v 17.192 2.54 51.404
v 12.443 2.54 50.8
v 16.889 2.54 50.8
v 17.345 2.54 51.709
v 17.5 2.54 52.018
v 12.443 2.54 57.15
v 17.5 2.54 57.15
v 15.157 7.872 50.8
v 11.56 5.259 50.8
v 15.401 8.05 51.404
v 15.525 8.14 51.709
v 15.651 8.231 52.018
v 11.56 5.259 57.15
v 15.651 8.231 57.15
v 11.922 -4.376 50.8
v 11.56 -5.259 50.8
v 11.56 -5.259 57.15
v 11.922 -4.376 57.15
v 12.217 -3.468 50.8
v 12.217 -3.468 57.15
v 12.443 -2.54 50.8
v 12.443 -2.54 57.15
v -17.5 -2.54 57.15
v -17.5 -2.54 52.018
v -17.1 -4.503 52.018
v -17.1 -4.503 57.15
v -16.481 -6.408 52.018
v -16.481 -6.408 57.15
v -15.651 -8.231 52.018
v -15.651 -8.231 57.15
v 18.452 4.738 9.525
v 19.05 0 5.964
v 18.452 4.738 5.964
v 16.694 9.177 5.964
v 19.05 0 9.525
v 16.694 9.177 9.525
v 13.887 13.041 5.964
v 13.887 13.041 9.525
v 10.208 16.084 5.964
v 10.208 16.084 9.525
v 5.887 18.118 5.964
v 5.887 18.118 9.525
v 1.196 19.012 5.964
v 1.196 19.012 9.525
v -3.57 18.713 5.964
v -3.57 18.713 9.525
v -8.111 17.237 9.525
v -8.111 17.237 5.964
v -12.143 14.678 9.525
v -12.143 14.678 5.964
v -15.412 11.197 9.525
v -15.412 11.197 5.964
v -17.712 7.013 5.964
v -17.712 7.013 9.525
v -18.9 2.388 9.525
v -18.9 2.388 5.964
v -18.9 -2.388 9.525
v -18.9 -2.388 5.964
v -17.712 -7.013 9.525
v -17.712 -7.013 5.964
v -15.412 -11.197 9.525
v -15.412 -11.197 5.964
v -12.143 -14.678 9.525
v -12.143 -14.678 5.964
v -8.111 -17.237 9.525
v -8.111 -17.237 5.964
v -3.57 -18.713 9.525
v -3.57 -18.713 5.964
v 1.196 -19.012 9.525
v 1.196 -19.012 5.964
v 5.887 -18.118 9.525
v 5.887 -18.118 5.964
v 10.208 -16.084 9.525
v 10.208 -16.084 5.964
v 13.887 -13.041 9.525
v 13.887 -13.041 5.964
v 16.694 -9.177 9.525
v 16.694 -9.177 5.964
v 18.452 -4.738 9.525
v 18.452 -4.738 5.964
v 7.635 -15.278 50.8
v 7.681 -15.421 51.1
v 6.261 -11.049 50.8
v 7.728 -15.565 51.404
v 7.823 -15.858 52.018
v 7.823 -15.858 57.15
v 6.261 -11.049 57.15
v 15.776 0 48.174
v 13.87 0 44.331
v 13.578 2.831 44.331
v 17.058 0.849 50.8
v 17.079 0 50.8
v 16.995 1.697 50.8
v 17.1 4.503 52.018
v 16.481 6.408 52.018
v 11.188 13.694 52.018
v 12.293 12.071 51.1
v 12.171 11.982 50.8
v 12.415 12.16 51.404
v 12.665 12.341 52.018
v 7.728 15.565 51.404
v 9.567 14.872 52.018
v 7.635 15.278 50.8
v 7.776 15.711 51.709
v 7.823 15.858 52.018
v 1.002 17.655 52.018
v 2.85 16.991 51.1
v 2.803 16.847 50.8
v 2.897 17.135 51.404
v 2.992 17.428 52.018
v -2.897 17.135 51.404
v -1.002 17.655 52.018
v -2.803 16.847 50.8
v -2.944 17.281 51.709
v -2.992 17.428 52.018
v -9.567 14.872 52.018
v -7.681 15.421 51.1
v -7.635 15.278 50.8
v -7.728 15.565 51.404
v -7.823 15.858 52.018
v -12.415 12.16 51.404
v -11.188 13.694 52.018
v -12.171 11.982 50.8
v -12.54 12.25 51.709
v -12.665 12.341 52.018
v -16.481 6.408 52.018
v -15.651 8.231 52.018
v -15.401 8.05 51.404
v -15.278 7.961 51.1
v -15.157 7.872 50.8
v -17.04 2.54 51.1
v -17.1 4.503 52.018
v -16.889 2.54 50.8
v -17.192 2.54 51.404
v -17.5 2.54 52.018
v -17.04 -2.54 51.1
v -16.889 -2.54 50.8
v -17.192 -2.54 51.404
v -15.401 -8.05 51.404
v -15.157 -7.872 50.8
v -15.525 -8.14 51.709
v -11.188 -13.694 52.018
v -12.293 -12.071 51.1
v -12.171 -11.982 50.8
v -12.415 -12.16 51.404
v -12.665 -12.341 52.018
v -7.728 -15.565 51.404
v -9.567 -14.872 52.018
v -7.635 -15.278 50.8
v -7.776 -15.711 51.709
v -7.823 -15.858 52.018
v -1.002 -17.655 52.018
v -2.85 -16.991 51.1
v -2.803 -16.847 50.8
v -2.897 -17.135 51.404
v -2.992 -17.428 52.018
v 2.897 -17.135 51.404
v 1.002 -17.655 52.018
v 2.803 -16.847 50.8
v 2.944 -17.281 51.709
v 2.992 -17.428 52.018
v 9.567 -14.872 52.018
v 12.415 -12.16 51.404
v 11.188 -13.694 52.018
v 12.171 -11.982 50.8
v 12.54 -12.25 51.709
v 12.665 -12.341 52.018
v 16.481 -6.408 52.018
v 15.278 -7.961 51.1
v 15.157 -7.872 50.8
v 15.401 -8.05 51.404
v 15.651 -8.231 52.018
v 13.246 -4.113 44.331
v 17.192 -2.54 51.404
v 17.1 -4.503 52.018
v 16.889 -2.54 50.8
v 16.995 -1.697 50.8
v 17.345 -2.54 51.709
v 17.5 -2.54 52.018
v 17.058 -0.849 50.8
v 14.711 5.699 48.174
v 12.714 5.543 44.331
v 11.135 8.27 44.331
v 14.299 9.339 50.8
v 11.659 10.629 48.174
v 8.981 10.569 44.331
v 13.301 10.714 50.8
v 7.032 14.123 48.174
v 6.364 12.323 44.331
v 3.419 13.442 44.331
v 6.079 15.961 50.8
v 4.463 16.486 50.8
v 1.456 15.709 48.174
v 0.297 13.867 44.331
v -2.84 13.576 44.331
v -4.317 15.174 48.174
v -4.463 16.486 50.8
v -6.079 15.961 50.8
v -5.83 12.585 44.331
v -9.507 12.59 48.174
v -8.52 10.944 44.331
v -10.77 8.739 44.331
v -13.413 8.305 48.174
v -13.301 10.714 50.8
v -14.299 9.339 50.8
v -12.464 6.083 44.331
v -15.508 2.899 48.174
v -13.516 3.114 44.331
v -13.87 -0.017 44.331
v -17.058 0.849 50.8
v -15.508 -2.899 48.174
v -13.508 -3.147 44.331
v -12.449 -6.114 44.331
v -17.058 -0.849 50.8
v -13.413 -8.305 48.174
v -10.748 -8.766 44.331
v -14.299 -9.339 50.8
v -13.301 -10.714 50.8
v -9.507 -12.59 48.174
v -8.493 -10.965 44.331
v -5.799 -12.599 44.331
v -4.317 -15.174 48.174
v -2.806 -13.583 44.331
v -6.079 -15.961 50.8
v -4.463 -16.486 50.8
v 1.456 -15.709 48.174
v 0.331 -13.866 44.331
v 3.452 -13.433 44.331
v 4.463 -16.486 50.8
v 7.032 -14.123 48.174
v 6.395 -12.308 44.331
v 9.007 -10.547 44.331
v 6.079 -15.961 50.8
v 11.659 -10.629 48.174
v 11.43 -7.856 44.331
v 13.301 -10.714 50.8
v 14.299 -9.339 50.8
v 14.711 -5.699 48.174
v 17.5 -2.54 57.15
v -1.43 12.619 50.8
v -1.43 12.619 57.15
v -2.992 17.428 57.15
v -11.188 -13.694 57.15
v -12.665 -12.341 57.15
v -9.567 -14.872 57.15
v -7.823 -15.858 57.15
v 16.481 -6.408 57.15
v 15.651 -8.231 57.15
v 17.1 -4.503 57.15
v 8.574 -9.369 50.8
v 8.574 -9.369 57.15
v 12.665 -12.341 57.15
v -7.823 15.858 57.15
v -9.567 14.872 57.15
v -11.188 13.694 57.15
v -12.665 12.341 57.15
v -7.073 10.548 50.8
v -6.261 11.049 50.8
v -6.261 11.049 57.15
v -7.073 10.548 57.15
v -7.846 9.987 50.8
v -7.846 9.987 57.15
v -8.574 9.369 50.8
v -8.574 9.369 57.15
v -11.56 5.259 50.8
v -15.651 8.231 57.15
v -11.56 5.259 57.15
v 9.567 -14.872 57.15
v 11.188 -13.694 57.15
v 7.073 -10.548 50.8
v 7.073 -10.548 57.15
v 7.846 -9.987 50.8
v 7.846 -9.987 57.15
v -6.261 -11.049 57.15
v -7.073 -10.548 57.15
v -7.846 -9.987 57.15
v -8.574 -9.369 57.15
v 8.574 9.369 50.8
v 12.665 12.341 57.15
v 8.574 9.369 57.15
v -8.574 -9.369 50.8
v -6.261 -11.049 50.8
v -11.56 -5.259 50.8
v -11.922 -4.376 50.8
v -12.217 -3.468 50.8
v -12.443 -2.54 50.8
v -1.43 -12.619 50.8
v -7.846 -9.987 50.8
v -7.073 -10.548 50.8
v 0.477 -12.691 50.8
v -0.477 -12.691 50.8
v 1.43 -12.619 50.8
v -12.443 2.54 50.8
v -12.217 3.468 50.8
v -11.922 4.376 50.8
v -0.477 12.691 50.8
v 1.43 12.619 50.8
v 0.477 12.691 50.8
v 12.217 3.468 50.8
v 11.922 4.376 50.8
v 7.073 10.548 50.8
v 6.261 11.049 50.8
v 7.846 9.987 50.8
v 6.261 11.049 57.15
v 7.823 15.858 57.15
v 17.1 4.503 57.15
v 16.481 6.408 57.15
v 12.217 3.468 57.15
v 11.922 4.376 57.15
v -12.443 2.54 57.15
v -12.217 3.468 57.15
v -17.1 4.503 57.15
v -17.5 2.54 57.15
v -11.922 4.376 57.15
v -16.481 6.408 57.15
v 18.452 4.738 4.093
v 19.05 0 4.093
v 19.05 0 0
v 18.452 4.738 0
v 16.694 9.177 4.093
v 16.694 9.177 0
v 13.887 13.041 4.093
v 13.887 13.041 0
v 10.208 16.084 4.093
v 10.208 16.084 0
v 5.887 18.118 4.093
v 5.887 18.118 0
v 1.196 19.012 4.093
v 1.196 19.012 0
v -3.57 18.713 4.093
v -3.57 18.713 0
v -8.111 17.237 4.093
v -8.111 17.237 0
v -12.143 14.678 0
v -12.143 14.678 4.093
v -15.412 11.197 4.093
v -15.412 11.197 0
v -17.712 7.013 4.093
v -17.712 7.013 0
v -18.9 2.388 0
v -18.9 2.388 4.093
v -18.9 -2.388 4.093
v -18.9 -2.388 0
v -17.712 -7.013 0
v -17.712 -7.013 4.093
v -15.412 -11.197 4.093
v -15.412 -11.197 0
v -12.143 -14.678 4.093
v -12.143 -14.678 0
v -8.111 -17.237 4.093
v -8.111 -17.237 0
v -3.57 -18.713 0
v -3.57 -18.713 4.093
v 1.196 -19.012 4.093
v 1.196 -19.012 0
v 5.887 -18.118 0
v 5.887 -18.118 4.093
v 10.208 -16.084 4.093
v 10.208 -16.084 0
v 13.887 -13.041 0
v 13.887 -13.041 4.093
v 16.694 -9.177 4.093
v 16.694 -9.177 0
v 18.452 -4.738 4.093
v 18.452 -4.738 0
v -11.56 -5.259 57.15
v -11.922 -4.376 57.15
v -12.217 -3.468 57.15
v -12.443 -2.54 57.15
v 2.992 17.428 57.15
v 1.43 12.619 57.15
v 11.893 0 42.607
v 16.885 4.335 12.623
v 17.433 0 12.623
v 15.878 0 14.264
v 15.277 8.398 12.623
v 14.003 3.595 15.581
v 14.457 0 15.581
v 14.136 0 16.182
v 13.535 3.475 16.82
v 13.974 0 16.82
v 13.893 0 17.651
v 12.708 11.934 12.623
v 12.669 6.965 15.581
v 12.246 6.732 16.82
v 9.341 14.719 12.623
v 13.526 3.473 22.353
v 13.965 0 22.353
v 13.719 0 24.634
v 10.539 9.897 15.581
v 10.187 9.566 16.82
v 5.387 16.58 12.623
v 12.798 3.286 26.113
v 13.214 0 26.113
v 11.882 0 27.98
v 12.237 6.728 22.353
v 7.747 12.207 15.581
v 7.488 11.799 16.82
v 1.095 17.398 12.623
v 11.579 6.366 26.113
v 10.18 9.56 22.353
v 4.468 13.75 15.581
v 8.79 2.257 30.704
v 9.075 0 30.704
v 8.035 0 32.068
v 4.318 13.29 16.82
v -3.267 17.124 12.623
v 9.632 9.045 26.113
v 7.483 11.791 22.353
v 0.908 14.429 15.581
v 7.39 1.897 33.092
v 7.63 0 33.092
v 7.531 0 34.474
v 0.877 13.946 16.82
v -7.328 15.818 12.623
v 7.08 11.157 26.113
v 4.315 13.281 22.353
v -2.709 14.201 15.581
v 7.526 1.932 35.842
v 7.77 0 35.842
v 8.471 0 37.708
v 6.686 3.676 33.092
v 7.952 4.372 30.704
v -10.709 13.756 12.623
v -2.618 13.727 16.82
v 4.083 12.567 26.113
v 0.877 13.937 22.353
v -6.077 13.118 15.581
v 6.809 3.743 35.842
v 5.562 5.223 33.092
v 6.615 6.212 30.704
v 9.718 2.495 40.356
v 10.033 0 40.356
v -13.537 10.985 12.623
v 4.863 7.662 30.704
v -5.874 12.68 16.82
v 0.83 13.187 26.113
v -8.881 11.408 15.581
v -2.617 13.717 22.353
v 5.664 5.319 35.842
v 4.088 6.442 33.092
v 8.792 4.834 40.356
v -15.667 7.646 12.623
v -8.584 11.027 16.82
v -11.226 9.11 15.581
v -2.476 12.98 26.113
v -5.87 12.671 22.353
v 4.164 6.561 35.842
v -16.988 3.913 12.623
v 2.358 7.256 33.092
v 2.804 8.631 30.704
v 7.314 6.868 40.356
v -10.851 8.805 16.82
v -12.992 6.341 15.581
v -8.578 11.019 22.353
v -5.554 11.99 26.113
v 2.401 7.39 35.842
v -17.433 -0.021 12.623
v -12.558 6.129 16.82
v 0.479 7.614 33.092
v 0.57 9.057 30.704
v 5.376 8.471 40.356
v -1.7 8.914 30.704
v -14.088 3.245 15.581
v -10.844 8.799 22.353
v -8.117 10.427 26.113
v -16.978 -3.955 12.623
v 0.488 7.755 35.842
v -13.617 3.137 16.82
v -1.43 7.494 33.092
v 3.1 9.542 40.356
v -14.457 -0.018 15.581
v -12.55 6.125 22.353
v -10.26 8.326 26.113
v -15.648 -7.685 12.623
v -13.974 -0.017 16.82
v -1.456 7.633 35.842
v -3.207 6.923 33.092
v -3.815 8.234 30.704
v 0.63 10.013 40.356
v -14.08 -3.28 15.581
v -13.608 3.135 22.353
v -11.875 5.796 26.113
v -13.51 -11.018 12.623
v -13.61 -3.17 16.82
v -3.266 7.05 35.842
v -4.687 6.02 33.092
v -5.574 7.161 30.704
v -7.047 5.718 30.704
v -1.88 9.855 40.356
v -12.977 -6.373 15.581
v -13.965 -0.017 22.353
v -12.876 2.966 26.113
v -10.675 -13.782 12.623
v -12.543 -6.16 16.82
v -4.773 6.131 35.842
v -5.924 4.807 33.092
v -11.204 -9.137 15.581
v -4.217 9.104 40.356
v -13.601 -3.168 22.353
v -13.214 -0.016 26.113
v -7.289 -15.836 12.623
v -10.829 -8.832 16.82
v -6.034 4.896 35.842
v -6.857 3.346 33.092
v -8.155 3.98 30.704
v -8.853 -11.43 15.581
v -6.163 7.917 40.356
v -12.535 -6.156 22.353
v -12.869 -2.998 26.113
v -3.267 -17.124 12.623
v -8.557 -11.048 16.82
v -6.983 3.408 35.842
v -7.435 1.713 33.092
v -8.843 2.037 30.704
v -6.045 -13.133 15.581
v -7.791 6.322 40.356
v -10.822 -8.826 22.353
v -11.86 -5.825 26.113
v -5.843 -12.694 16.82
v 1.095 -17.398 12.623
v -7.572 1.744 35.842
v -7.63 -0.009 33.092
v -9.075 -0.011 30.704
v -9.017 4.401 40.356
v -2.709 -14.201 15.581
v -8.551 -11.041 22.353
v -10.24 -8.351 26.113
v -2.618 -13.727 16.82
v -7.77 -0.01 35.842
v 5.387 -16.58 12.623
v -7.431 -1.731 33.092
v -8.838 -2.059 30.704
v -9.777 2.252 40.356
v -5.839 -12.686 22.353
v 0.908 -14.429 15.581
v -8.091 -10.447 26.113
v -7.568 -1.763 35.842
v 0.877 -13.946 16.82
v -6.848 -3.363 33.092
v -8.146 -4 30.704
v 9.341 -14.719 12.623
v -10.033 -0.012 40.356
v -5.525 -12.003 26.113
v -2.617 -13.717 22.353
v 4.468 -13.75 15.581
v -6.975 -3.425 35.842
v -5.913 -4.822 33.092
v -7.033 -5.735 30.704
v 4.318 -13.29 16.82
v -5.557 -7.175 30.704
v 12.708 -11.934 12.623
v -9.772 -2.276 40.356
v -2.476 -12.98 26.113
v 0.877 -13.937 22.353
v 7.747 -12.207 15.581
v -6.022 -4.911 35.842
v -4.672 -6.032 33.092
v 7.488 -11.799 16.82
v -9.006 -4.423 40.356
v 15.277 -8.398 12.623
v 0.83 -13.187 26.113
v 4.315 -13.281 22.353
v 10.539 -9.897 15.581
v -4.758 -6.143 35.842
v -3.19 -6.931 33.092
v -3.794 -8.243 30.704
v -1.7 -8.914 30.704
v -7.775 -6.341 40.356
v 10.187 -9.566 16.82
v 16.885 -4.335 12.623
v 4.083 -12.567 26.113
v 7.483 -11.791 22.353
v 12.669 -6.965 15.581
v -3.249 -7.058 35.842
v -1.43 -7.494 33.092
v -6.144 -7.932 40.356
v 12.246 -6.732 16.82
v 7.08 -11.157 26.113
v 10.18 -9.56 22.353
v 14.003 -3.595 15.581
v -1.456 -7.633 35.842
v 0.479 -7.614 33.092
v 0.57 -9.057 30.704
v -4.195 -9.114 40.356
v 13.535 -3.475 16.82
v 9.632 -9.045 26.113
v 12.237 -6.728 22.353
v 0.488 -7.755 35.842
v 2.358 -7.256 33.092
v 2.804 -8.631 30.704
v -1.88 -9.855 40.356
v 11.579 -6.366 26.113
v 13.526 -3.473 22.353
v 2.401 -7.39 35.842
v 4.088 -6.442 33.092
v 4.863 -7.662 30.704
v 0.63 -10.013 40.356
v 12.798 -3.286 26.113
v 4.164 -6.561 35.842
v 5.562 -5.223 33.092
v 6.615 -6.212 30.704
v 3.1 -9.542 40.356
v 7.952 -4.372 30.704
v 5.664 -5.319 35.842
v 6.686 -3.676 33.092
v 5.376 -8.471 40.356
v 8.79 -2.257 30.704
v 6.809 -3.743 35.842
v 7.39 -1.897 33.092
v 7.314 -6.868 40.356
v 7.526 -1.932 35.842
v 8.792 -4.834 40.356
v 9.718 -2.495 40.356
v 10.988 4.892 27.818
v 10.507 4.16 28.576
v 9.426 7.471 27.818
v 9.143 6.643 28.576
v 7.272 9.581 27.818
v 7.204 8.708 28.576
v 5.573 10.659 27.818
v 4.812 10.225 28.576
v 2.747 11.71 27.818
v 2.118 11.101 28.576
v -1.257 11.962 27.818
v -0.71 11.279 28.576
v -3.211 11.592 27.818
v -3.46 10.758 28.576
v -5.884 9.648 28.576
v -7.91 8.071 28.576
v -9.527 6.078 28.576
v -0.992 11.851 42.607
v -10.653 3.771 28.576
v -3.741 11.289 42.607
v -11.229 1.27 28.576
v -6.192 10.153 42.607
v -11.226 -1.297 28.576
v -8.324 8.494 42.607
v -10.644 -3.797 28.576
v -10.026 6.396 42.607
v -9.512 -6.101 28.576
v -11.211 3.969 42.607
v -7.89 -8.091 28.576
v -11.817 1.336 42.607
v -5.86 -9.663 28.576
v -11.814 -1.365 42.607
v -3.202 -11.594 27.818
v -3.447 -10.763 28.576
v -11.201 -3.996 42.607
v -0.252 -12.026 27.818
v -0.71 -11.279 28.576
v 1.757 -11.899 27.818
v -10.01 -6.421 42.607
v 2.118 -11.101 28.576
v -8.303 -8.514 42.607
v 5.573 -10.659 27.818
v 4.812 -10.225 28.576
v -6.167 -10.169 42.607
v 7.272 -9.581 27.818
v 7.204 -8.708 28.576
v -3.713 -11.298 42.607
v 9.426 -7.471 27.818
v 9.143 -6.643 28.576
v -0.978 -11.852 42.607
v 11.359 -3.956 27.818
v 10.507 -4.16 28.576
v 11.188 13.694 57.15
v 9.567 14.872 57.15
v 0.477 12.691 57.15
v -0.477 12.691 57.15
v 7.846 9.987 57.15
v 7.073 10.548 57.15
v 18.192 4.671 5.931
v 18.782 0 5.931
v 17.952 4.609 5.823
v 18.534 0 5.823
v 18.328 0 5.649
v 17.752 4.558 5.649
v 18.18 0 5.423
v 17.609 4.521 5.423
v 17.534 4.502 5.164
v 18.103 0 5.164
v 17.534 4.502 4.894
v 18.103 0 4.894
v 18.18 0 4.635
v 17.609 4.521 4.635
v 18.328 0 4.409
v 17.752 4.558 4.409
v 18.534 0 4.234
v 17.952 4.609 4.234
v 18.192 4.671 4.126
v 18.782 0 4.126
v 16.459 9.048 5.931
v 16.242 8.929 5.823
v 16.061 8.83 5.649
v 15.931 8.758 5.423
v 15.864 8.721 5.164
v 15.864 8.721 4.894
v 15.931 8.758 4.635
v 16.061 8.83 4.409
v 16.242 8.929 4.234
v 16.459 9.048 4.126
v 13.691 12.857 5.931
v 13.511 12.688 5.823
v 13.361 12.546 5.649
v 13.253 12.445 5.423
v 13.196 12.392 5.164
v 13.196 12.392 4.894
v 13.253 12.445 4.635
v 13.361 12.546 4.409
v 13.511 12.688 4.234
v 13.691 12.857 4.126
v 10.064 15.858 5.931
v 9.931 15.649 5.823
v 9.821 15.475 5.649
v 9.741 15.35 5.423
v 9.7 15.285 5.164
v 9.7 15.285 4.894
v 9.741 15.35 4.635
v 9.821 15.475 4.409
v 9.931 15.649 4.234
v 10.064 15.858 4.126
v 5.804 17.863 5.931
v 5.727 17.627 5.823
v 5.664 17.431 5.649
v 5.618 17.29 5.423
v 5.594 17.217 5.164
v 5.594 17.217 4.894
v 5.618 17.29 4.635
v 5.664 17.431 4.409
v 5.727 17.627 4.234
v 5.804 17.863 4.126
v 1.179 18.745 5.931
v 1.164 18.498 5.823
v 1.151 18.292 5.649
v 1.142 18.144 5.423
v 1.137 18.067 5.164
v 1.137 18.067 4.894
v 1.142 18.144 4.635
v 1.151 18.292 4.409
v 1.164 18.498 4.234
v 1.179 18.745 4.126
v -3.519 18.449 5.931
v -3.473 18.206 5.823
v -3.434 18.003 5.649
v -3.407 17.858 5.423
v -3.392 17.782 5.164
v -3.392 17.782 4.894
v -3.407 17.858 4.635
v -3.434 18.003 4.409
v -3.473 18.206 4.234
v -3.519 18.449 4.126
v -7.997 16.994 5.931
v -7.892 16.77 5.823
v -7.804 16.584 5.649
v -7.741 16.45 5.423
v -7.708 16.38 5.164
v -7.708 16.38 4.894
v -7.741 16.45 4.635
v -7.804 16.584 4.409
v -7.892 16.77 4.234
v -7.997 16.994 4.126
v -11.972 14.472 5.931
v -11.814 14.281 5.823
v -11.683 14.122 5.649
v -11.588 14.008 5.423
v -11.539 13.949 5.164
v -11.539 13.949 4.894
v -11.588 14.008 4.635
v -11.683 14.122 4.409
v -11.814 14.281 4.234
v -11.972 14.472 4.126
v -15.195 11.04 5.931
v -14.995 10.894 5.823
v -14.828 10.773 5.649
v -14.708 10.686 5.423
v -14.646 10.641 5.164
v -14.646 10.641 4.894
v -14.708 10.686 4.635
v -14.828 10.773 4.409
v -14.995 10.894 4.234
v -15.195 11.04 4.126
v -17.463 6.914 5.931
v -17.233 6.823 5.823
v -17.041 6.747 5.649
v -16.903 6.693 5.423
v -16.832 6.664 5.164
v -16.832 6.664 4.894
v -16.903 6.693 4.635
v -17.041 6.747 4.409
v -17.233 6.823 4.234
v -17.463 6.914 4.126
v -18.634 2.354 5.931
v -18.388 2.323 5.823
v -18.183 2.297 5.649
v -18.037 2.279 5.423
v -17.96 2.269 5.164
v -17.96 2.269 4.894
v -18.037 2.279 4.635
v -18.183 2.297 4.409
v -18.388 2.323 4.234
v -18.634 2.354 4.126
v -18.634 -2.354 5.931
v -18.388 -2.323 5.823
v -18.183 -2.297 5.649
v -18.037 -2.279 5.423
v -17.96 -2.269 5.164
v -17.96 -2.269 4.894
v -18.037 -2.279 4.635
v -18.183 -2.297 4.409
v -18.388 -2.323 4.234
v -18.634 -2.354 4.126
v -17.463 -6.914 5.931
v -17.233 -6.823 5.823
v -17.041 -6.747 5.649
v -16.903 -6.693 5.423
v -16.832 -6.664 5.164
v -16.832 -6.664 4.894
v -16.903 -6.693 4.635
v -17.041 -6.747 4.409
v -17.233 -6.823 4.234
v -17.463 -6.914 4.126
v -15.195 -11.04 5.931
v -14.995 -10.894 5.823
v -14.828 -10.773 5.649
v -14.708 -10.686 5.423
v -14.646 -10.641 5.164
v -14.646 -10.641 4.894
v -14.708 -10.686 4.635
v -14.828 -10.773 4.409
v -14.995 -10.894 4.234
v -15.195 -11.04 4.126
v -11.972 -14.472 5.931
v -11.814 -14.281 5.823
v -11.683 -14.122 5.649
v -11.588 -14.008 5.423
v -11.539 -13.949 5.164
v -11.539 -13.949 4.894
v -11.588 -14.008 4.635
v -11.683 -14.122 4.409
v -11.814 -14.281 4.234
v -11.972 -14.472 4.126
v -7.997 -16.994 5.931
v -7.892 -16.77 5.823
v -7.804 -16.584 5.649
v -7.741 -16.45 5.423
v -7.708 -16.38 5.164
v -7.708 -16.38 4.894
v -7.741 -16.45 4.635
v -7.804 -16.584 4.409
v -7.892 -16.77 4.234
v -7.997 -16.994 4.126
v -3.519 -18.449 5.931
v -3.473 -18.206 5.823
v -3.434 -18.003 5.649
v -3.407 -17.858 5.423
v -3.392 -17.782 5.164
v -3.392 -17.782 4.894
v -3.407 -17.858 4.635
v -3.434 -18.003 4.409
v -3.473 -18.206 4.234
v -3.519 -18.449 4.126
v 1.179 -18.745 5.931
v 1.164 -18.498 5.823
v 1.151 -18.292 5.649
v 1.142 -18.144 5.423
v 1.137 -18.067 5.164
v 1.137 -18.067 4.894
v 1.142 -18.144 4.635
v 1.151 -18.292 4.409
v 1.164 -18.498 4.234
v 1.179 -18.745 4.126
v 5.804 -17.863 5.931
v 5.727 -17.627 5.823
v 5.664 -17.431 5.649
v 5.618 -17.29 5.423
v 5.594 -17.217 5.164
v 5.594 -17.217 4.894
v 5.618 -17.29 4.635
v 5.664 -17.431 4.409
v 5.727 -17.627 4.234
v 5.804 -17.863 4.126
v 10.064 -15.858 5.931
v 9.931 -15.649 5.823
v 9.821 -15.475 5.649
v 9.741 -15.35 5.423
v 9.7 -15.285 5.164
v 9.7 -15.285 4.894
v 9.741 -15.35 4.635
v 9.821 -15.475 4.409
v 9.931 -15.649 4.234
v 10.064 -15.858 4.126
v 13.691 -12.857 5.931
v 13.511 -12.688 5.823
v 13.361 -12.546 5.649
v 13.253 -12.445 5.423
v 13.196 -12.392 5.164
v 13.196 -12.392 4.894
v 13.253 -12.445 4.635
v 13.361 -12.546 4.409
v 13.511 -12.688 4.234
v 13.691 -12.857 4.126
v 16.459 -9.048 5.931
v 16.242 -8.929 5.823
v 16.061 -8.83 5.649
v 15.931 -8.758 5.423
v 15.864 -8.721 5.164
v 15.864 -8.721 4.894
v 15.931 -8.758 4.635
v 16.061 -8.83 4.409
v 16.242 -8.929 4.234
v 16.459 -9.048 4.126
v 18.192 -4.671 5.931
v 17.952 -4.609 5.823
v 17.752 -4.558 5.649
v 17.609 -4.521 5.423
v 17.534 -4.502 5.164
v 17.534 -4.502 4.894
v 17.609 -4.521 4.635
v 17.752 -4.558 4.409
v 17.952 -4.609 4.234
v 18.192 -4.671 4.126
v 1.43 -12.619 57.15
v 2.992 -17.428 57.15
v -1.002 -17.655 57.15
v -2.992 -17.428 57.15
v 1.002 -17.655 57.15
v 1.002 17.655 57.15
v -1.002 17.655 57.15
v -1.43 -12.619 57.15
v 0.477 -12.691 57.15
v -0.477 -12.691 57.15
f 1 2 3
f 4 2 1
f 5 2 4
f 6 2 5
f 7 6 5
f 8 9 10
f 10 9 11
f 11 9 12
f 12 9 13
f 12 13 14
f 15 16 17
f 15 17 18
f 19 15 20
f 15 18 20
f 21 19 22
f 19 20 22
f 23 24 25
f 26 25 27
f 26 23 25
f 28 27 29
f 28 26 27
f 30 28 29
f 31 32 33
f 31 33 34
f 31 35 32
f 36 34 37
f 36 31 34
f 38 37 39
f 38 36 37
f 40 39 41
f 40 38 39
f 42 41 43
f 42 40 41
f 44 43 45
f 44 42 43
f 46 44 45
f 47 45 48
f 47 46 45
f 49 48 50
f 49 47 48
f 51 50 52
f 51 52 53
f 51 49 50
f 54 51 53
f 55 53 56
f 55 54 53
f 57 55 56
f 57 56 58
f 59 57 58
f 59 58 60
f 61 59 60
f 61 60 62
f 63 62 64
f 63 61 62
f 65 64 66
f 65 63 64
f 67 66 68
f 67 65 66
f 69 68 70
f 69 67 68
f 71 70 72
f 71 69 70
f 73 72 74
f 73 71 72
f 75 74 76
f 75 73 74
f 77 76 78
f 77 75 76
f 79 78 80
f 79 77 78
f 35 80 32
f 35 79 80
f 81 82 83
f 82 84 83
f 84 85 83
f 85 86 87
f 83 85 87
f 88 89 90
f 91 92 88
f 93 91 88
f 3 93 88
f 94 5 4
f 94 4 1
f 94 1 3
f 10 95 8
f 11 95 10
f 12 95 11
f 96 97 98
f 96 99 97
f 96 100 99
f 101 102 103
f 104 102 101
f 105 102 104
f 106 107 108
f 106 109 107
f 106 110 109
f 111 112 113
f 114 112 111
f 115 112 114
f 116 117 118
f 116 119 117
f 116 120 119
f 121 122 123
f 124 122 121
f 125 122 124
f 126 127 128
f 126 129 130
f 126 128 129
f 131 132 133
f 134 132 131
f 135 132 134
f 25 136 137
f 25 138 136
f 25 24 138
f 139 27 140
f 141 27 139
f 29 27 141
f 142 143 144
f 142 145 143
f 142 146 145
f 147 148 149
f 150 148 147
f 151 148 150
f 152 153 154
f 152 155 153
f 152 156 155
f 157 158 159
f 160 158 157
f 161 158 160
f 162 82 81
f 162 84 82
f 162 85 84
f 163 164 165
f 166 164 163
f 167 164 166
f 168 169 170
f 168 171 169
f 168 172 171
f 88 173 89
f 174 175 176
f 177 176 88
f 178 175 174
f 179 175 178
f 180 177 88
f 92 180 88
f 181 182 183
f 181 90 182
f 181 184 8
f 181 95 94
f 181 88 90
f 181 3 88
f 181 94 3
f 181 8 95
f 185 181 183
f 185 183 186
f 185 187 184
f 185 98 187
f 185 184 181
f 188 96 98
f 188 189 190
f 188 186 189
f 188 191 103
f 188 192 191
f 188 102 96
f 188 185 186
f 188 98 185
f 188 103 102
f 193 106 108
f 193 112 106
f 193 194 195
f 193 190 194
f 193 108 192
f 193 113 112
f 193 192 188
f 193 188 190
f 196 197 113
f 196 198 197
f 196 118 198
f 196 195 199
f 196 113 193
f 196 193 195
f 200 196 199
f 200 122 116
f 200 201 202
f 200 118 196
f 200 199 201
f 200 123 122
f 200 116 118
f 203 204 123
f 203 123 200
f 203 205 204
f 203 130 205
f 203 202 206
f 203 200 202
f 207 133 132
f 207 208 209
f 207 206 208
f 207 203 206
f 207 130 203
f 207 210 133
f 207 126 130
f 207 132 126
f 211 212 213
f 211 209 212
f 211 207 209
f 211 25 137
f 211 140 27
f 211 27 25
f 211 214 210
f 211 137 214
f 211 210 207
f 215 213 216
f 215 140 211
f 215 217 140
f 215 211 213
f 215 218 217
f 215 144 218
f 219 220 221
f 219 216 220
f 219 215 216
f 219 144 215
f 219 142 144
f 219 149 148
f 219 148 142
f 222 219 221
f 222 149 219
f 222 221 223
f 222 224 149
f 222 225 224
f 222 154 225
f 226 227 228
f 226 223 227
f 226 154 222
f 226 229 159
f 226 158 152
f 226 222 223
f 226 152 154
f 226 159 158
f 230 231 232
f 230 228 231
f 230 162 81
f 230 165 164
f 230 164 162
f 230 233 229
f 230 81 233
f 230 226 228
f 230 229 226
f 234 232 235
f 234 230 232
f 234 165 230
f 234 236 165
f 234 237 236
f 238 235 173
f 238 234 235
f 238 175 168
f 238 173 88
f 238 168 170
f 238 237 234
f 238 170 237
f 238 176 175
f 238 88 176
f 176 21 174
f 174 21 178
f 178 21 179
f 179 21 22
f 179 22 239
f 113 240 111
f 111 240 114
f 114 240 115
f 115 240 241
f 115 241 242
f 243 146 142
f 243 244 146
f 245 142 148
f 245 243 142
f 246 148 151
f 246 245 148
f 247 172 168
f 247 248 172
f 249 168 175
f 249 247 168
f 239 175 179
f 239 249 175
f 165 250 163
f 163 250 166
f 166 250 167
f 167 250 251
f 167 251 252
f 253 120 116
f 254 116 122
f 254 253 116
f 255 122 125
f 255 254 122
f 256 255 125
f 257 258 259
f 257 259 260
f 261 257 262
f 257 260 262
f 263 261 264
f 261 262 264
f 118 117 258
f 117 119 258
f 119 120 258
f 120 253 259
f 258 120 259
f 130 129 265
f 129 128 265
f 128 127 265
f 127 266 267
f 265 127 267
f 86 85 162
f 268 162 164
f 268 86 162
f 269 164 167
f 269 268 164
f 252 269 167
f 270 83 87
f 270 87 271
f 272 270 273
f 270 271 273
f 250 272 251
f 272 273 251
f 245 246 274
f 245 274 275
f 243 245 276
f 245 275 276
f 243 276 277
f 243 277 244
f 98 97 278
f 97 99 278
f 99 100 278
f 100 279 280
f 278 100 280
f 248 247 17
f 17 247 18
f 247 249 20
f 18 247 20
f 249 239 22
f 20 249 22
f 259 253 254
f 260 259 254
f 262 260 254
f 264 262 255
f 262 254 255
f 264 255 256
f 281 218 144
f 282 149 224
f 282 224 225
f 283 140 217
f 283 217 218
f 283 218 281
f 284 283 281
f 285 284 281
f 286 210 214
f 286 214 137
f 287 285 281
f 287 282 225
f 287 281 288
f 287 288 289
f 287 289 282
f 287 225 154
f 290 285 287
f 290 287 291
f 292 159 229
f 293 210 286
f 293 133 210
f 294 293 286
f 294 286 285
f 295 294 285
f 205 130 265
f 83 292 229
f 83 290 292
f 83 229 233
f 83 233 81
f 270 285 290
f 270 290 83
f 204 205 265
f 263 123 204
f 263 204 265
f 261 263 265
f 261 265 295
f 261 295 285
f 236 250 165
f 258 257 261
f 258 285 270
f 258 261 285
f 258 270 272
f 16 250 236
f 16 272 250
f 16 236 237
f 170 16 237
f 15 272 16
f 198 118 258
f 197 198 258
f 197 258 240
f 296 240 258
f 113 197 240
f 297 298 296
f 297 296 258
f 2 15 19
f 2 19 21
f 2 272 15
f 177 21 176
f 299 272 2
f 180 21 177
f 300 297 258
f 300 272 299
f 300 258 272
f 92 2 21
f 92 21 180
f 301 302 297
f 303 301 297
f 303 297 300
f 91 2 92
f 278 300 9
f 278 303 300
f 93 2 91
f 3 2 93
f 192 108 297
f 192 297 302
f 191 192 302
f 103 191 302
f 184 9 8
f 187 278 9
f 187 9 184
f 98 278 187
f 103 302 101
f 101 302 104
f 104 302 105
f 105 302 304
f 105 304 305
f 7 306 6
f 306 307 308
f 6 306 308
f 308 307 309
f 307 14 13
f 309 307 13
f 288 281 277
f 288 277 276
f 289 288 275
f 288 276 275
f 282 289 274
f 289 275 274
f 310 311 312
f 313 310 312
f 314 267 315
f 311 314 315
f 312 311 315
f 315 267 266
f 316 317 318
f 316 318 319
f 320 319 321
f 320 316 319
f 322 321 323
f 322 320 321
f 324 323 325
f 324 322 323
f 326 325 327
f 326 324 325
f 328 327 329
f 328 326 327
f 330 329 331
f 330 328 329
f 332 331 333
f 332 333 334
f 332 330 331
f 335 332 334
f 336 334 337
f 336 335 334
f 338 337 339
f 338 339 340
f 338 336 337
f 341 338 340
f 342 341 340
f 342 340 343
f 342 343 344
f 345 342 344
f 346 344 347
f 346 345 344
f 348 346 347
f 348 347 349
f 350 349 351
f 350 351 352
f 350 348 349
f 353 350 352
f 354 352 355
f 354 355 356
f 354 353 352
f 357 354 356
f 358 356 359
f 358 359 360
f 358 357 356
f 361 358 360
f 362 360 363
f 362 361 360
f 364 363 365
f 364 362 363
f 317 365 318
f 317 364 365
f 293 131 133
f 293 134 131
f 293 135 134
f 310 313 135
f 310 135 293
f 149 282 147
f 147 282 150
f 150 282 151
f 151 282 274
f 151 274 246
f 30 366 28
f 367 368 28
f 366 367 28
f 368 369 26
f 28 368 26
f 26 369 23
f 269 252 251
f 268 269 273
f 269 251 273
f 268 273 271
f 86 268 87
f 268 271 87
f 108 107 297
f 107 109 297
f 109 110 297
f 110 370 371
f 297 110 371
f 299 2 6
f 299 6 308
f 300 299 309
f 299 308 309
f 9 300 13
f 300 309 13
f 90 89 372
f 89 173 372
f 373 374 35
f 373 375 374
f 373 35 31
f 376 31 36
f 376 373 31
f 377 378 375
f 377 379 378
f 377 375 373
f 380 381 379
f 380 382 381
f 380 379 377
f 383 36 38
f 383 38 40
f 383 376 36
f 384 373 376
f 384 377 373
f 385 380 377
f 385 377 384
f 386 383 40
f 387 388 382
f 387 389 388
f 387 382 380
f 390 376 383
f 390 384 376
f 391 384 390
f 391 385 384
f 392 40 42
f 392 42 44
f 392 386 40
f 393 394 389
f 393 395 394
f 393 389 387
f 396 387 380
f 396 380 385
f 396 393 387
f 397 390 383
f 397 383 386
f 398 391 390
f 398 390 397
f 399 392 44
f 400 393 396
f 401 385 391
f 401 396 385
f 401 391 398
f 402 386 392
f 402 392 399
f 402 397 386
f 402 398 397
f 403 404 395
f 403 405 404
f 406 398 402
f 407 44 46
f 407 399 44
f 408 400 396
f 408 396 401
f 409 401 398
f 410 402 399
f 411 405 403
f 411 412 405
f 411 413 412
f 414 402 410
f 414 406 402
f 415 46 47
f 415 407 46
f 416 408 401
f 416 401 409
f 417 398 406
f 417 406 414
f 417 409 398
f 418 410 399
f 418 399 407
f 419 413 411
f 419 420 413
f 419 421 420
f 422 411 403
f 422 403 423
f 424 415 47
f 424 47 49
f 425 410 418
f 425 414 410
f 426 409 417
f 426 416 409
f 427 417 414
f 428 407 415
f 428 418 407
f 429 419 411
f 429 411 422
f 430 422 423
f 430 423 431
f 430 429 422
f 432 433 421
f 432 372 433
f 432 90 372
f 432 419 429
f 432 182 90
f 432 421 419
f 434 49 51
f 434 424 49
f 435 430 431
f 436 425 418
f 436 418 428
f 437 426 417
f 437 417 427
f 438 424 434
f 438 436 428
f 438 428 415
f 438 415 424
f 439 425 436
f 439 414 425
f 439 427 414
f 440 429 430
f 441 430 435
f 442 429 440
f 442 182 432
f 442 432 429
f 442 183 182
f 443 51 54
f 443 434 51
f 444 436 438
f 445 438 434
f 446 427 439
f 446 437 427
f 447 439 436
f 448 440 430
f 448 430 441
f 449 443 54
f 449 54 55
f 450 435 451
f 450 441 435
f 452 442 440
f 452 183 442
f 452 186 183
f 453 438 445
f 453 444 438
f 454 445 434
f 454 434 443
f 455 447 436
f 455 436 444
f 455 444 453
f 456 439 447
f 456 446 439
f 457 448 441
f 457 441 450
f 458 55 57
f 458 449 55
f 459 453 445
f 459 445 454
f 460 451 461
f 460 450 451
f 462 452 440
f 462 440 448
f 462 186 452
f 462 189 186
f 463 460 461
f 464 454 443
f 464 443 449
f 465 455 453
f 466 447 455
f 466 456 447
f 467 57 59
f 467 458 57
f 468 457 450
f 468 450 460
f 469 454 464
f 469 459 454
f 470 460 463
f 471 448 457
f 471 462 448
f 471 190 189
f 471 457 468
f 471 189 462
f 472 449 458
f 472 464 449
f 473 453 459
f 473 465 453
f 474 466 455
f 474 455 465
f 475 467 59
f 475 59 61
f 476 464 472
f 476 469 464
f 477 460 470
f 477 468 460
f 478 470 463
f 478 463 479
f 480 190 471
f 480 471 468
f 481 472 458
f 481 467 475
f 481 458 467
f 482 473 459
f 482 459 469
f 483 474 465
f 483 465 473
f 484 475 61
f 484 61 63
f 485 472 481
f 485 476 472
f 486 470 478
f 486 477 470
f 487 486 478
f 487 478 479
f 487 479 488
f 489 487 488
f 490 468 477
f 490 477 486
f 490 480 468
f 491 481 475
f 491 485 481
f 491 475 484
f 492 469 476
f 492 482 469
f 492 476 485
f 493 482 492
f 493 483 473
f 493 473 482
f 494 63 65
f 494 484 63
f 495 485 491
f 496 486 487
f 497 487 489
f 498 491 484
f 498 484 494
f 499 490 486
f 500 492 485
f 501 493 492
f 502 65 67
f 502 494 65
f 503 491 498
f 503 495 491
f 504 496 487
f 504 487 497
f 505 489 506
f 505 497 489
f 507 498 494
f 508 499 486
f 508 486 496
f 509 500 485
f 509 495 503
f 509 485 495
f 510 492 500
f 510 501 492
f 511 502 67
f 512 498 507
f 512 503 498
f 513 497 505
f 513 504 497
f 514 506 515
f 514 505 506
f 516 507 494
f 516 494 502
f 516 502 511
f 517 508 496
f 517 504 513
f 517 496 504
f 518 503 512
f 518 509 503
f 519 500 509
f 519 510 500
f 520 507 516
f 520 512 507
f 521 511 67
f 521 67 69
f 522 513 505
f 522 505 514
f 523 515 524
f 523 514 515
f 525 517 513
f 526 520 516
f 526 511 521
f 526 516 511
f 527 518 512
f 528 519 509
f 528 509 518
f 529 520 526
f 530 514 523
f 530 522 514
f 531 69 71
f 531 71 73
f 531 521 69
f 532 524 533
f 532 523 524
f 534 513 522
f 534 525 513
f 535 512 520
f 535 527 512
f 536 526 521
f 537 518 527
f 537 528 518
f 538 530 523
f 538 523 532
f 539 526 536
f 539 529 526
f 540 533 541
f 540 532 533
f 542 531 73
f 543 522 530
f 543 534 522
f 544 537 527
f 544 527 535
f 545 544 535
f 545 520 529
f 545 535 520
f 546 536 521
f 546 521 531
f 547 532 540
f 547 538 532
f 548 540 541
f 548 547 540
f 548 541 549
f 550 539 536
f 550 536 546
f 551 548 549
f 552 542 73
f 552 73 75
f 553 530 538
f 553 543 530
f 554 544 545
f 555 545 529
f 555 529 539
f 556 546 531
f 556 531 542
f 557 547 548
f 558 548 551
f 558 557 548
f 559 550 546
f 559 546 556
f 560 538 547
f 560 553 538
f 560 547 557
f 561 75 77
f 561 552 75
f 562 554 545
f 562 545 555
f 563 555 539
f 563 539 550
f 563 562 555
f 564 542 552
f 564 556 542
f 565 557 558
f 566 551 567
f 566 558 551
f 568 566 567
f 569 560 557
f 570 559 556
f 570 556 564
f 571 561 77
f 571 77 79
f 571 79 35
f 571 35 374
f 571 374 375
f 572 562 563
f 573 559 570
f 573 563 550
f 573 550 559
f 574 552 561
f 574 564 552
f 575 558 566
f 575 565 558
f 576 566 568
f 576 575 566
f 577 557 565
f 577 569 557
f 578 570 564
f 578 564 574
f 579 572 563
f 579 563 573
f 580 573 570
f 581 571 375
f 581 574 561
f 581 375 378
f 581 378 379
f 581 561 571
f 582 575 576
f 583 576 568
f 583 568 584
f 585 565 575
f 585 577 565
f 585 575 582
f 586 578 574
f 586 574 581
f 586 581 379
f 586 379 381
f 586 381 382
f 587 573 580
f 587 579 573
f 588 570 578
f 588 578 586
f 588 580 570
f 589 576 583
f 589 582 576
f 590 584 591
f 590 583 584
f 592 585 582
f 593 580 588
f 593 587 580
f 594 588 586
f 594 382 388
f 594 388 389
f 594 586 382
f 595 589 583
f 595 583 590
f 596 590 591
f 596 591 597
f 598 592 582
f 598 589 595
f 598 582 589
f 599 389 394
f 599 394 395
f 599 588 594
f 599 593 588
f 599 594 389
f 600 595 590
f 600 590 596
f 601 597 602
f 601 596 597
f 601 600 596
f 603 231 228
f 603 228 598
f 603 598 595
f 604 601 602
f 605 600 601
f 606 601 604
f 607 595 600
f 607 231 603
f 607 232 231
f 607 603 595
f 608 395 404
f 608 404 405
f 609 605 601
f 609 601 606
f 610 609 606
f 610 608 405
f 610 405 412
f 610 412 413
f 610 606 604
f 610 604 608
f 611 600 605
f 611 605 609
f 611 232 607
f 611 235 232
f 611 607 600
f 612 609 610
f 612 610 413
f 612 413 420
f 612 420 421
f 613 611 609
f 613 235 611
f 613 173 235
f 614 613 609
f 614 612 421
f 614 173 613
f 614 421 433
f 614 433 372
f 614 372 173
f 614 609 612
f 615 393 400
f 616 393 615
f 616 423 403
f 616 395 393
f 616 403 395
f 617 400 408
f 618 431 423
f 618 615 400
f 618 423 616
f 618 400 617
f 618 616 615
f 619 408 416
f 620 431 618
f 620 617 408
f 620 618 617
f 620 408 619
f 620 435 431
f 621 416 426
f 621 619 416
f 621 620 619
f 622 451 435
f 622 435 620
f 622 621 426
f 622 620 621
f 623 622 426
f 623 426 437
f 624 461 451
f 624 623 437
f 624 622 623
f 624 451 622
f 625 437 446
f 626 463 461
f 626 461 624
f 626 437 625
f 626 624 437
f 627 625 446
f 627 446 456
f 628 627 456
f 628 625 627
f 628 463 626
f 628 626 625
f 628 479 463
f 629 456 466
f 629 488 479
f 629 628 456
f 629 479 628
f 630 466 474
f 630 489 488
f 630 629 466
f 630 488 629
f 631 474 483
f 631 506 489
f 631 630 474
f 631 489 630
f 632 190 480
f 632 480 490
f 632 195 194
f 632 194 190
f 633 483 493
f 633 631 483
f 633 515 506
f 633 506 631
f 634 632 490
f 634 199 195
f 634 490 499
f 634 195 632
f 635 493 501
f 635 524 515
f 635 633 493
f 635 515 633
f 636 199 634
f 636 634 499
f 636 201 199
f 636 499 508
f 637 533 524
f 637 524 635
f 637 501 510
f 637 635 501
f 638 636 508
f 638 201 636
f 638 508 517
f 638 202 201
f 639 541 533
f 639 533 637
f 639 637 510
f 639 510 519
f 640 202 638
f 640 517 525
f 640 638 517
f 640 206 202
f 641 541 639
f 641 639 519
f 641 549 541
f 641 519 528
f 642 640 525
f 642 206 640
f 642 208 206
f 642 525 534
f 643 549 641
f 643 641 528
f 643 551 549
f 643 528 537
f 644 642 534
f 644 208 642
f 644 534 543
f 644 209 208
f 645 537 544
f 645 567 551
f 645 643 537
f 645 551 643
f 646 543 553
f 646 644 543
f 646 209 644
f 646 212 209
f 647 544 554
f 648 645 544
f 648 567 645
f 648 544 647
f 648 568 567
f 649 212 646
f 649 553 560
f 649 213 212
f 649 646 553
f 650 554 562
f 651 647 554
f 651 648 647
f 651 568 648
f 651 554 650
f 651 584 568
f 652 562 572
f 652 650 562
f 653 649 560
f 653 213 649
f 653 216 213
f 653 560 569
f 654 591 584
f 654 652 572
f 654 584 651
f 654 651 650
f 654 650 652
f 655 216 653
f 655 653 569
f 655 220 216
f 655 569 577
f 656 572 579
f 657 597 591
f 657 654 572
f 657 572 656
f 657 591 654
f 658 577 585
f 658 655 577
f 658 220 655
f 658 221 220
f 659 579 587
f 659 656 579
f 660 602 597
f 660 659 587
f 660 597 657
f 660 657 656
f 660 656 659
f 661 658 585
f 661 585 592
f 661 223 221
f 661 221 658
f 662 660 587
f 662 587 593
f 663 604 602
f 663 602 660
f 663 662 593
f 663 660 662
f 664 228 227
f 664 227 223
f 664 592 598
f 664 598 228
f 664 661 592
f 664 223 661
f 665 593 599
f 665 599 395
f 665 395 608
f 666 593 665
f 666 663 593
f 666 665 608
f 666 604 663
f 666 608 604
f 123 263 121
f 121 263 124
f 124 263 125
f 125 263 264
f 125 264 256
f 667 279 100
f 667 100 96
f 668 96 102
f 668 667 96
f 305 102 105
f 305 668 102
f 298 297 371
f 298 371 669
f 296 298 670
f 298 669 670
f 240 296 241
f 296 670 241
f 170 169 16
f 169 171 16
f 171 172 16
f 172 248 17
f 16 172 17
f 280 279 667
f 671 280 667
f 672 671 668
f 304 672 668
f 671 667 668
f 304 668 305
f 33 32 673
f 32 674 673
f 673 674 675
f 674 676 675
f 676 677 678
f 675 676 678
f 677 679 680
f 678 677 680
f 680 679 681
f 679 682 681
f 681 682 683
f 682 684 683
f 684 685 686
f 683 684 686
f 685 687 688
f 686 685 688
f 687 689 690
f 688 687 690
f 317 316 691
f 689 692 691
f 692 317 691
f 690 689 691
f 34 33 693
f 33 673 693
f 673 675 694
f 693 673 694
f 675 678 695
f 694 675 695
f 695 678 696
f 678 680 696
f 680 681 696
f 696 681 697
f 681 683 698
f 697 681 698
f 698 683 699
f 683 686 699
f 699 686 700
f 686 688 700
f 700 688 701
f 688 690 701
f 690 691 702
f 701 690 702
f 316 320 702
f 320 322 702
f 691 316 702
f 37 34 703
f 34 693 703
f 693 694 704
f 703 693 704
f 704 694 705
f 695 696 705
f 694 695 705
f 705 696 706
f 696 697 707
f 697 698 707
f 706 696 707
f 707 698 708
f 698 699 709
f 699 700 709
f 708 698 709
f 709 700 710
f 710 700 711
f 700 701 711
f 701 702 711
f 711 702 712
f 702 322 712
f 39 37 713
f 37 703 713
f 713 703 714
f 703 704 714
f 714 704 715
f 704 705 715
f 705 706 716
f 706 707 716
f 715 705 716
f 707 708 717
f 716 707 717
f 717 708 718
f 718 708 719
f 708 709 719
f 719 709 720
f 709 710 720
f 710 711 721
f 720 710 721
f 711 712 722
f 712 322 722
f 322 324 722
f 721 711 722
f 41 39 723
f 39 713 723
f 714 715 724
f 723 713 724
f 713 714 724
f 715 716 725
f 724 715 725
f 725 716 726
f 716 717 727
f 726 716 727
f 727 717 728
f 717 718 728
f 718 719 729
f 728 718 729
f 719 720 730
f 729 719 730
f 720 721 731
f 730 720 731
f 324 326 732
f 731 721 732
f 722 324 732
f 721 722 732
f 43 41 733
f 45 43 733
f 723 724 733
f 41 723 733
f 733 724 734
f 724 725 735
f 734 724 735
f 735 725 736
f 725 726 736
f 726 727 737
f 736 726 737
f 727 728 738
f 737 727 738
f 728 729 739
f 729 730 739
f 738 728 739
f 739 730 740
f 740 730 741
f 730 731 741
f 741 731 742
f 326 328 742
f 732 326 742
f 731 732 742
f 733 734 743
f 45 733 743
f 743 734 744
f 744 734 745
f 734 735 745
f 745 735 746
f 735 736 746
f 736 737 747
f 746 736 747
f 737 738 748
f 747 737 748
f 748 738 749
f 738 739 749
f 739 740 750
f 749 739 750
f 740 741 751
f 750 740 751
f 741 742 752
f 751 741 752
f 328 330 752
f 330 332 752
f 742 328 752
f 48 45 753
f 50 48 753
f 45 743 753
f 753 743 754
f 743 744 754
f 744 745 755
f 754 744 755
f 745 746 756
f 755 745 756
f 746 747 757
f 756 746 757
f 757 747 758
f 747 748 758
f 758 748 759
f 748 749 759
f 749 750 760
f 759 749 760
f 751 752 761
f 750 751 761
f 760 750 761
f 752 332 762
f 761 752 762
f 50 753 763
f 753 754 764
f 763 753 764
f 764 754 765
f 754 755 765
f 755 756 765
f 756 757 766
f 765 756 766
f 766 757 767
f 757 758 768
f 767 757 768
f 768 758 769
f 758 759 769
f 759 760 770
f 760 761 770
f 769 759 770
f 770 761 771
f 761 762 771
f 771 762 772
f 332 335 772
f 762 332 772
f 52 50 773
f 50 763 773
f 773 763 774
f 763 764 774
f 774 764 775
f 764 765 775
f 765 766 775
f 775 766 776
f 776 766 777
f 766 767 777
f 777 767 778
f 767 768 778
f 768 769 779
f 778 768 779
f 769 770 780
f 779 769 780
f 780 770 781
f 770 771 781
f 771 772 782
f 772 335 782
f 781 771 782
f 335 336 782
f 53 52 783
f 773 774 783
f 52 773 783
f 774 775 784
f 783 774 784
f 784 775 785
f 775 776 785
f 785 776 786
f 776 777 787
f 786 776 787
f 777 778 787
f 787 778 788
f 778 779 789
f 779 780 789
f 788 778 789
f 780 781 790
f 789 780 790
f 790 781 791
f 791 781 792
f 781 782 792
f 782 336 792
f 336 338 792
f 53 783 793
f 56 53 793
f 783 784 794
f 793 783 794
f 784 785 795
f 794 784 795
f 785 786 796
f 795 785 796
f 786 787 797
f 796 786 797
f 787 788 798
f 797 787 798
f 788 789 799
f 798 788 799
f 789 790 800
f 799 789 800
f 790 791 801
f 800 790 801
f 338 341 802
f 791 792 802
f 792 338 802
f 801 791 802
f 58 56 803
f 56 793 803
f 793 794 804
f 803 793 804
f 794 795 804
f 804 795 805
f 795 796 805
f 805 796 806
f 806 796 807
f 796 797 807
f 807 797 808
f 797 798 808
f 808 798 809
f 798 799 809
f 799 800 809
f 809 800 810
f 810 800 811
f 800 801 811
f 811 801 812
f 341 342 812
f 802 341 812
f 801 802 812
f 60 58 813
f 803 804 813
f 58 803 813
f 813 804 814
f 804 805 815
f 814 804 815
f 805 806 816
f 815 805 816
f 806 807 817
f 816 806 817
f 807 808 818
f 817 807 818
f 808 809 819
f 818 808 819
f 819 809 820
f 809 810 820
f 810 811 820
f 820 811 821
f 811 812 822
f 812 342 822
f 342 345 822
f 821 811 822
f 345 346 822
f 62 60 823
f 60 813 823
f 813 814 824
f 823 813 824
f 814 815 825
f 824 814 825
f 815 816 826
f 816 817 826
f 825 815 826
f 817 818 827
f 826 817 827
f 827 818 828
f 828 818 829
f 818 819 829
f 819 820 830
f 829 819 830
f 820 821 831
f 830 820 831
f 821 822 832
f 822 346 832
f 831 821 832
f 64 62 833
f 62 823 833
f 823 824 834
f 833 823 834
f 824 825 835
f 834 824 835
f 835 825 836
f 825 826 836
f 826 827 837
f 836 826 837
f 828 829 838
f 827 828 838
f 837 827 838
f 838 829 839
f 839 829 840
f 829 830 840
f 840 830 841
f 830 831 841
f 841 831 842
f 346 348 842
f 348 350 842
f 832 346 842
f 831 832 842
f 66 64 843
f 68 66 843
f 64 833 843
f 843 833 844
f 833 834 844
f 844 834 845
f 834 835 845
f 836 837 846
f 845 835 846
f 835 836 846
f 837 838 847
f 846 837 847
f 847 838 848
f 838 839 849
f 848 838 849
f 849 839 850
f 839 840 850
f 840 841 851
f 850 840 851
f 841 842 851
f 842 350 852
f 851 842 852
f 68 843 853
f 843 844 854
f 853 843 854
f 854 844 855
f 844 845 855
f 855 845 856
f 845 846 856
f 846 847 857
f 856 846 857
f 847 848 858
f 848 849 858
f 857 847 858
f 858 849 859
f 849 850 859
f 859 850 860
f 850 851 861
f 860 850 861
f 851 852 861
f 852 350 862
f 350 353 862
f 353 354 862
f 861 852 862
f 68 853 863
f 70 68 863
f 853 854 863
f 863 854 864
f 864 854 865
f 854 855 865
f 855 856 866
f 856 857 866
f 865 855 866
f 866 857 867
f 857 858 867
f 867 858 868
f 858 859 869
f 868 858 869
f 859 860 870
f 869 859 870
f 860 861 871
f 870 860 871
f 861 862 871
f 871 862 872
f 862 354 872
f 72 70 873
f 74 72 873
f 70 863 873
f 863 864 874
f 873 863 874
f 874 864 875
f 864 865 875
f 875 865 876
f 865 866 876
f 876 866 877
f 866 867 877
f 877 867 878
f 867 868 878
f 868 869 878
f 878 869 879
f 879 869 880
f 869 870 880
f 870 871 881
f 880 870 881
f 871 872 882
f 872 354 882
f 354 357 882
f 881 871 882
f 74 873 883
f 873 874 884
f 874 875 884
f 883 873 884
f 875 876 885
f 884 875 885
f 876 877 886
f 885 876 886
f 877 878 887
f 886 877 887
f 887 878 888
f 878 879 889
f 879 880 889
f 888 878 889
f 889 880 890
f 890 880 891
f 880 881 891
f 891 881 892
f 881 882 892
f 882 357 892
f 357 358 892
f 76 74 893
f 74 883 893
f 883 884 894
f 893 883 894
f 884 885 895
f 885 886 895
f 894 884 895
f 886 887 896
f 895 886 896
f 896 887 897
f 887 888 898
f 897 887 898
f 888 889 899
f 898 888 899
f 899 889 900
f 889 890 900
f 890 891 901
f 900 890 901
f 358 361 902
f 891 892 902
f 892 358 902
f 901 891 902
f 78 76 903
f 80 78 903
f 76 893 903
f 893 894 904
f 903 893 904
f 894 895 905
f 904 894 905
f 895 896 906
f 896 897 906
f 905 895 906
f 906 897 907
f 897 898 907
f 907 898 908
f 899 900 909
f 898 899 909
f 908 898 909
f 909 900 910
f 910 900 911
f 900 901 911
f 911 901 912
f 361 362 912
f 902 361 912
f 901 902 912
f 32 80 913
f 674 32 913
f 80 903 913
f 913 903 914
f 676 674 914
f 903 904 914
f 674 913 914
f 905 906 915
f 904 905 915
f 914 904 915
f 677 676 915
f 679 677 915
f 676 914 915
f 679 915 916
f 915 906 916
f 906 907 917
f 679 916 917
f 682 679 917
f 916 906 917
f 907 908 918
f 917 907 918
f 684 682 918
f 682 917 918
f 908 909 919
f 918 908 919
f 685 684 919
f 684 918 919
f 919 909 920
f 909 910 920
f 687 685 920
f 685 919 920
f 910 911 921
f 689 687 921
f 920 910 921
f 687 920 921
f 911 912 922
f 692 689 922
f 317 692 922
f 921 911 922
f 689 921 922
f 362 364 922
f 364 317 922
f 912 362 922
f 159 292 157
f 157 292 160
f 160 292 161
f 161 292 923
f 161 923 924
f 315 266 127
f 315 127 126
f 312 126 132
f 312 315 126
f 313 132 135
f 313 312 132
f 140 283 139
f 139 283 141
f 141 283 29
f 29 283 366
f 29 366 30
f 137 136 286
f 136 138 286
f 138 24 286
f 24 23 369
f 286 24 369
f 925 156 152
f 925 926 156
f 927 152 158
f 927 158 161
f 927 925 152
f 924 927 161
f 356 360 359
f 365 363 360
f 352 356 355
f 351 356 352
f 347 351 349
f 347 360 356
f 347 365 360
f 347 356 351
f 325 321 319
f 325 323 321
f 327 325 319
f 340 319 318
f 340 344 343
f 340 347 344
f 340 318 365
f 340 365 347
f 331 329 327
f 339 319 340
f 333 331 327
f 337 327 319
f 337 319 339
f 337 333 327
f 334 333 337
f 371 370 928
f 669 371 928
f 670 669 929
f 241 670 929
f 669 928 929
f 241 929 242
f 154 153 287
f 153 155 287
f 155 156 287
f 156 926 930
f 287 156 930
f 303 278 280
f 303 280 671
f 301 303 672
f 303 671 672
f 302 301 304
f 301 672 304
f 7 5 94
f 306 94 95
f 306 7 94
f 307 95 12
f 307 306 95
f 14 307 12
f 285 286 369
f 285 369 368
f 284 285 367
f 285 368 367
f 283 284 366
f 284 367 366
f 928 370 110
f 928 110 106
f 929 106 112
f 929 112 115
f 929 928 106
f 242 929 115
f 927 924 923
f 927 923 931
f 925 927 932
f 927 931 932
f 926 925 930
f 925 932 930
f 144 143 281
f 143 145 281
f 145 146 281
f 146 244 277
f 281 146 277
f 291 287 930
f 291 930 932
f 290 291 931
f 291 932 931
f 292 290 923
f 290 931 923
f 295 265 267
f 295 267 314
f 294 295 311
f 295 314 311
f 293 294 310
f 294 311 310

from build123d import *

# Parameters (mm, degrees)
F0_W     = 17.6831819117
F0_H     = 10.16
F2_R     = 12.7
F3_DEPTH = 6.35
F4_W     = 9.8243676867
F4_H     = 5.08
F5_DEPTH = 6.35
F7_R     = 0.9355774764


# Not quite as in the source:
# - a fillet or chamfer that OpenCascade refuses, or shapes differently, is made with other operations: its cross-section is extruded or revolved along the edge and cut away or added


with BuildPart() as f1:
    # F0 (on Front) → F1 (revolve)
    with BuildSketch(Plane.XZ):
        with Locations((8.8415909559, 52.07)):
            Rectangle(F0_W, F0_H)
        with BuildLine():
            Line((0, 46.99), (0, 0))
            Line((0, 0), (19.05, 0))
            Line((19.05, 0), (19.05, 9.525))
            add(Edge.make_bspline(
                [(19.05, 9.525), (17.1376126861, 14.5770803043), (12.2594277566, 14.0530870359), (15.8311377158, 27.1771005404), (4.8442118801, 31.8163009505), (10.984866263, 42.7056935759), (14.4496818428, 44.7679251006), (17.6831819117, 46.99)],
                knots=[0, 0, 0, 0, 0.192461159, 0.3996068615, 0.6001290124, 0.8022738887, 1, 1, 1, 1], degree=3))
            Line((17.6831819117, 46.99), (0, 46.99))
        make_face()
    revolve(axis=Axis((0, 0, 28.575), (0, 0, 1)))

    # F2 (on face) → F3 (cut)
    with BuildSketch(Plane.XY.offset(57.15)):
        Circle(F2_R)
    extrude(amount=-F3_DEPTH, mode=Mode.SUBTRACT)

    # F4 (on face) → F5 (cut)
    with BuildSketch(Plane.XY.offset(57.15)):
        with Locations((15.24, 0)):
            Rectangle(F4_W, F4_H)
        Polygon((6.8624042447, 8.125441191), (9.8483533263, 4.0156348596), (17.7964337439, 9.7902532989), (14.8104846622, 13.9000596303), align=None)
        Polygon((0.7757871558, 10.6072400206), (5.6071542586, 9.0374336892), (8.6430508328, 18.3809625961), (3.81168373, 19.9507689275), align=None)
        Polygon((-5.6071542586, 9.0374336892), (-0.7757871558, 10.6072400206), (-3.81168373, 19.9507689275), (-8.6430508328, 18.3809625961), align=None)
        Polygon((-9.8483533263, 4.0156348596), (-6.8624042447, 8.125441191), (-14.8104846622, 13.9000596303), (-17.7964337439, 9.7902532989), align=None)
        with Locations((-15.24, 0)):
            Rectangle(F4_W, F4_H)
        Polygon((-6.8624042447, -8.125441191), (-9.8483533263, -4.0156348596), (-17.7964337439, -9.7902532989), (-14.8104846622, -13.9000596303), align=None)
        Polygon((-0.7757871558, -10.6072400206), (-5.6071542586, -9.0374336892), (-8.6430508328, -18.3809625961), (-3.81168373, -19.9507689275), align=None)
        Polygon((5.6071542586, -9.0374336892), (0.7757871558, -10.6072400206), (3.81168373, -19.9507689275), (8.6430508328, -18.3809625961), align=None)
        Polygon((9.8483533263, -4.0156348596), (6.8624042447, -8.125441191), (14.8104846622, -13.9000596303), (17.7964337439, -9.7902532989), align=None)
    extrude(amount=-F5_DEPTH, mode=Mode.SUBTRACT)

    # F6: chamfer of 5.08 on 1 edges, made by hand

    # F6_s1 → F6_t2 (revolve, cut)
    with BuildSketch(Plane.XZ):
        with BuildLine():
            Line((13.7794309142, 44.1484930415), (17.7734832624, 52.1998472193))
            Line((17.7734832624, 52.1998472193), (17.8750832624, 52.1998472193))
            ThreePointArc((17.8750832624, 52.1998472193), (17.7847819117, 49.5949236096), (17.7847819117, 46.99))
            Line((17.7847819117, 46.99), (17.7407244212, 46.90626578))
            ThreePointArc((17.7407244212, 46.90626578), (15.7475972656, 45.5454980697), (13.8409013181, 44.0675983603))
            Line((13.8409013181, 44.0675983603), (13.7794309142, 44.1484930415))
        make_face()
    revolve(axis=Axis((0, 0, 46.99), (0, 0, 1)), mode=Mode.SUBTRACT)

    # F7 (on Front) → F8 (revolve, cut)
    with BuildSketch(Plane.XZ):
        with Locations((19.0286766738, 5.0287479535)):
            Circle(F7_R)
    revolve(axis=Axis((0, 0, 5.0287479535), (0, 0, 1)), mode=Mode.SUBTRACT)


solid = f1.part
